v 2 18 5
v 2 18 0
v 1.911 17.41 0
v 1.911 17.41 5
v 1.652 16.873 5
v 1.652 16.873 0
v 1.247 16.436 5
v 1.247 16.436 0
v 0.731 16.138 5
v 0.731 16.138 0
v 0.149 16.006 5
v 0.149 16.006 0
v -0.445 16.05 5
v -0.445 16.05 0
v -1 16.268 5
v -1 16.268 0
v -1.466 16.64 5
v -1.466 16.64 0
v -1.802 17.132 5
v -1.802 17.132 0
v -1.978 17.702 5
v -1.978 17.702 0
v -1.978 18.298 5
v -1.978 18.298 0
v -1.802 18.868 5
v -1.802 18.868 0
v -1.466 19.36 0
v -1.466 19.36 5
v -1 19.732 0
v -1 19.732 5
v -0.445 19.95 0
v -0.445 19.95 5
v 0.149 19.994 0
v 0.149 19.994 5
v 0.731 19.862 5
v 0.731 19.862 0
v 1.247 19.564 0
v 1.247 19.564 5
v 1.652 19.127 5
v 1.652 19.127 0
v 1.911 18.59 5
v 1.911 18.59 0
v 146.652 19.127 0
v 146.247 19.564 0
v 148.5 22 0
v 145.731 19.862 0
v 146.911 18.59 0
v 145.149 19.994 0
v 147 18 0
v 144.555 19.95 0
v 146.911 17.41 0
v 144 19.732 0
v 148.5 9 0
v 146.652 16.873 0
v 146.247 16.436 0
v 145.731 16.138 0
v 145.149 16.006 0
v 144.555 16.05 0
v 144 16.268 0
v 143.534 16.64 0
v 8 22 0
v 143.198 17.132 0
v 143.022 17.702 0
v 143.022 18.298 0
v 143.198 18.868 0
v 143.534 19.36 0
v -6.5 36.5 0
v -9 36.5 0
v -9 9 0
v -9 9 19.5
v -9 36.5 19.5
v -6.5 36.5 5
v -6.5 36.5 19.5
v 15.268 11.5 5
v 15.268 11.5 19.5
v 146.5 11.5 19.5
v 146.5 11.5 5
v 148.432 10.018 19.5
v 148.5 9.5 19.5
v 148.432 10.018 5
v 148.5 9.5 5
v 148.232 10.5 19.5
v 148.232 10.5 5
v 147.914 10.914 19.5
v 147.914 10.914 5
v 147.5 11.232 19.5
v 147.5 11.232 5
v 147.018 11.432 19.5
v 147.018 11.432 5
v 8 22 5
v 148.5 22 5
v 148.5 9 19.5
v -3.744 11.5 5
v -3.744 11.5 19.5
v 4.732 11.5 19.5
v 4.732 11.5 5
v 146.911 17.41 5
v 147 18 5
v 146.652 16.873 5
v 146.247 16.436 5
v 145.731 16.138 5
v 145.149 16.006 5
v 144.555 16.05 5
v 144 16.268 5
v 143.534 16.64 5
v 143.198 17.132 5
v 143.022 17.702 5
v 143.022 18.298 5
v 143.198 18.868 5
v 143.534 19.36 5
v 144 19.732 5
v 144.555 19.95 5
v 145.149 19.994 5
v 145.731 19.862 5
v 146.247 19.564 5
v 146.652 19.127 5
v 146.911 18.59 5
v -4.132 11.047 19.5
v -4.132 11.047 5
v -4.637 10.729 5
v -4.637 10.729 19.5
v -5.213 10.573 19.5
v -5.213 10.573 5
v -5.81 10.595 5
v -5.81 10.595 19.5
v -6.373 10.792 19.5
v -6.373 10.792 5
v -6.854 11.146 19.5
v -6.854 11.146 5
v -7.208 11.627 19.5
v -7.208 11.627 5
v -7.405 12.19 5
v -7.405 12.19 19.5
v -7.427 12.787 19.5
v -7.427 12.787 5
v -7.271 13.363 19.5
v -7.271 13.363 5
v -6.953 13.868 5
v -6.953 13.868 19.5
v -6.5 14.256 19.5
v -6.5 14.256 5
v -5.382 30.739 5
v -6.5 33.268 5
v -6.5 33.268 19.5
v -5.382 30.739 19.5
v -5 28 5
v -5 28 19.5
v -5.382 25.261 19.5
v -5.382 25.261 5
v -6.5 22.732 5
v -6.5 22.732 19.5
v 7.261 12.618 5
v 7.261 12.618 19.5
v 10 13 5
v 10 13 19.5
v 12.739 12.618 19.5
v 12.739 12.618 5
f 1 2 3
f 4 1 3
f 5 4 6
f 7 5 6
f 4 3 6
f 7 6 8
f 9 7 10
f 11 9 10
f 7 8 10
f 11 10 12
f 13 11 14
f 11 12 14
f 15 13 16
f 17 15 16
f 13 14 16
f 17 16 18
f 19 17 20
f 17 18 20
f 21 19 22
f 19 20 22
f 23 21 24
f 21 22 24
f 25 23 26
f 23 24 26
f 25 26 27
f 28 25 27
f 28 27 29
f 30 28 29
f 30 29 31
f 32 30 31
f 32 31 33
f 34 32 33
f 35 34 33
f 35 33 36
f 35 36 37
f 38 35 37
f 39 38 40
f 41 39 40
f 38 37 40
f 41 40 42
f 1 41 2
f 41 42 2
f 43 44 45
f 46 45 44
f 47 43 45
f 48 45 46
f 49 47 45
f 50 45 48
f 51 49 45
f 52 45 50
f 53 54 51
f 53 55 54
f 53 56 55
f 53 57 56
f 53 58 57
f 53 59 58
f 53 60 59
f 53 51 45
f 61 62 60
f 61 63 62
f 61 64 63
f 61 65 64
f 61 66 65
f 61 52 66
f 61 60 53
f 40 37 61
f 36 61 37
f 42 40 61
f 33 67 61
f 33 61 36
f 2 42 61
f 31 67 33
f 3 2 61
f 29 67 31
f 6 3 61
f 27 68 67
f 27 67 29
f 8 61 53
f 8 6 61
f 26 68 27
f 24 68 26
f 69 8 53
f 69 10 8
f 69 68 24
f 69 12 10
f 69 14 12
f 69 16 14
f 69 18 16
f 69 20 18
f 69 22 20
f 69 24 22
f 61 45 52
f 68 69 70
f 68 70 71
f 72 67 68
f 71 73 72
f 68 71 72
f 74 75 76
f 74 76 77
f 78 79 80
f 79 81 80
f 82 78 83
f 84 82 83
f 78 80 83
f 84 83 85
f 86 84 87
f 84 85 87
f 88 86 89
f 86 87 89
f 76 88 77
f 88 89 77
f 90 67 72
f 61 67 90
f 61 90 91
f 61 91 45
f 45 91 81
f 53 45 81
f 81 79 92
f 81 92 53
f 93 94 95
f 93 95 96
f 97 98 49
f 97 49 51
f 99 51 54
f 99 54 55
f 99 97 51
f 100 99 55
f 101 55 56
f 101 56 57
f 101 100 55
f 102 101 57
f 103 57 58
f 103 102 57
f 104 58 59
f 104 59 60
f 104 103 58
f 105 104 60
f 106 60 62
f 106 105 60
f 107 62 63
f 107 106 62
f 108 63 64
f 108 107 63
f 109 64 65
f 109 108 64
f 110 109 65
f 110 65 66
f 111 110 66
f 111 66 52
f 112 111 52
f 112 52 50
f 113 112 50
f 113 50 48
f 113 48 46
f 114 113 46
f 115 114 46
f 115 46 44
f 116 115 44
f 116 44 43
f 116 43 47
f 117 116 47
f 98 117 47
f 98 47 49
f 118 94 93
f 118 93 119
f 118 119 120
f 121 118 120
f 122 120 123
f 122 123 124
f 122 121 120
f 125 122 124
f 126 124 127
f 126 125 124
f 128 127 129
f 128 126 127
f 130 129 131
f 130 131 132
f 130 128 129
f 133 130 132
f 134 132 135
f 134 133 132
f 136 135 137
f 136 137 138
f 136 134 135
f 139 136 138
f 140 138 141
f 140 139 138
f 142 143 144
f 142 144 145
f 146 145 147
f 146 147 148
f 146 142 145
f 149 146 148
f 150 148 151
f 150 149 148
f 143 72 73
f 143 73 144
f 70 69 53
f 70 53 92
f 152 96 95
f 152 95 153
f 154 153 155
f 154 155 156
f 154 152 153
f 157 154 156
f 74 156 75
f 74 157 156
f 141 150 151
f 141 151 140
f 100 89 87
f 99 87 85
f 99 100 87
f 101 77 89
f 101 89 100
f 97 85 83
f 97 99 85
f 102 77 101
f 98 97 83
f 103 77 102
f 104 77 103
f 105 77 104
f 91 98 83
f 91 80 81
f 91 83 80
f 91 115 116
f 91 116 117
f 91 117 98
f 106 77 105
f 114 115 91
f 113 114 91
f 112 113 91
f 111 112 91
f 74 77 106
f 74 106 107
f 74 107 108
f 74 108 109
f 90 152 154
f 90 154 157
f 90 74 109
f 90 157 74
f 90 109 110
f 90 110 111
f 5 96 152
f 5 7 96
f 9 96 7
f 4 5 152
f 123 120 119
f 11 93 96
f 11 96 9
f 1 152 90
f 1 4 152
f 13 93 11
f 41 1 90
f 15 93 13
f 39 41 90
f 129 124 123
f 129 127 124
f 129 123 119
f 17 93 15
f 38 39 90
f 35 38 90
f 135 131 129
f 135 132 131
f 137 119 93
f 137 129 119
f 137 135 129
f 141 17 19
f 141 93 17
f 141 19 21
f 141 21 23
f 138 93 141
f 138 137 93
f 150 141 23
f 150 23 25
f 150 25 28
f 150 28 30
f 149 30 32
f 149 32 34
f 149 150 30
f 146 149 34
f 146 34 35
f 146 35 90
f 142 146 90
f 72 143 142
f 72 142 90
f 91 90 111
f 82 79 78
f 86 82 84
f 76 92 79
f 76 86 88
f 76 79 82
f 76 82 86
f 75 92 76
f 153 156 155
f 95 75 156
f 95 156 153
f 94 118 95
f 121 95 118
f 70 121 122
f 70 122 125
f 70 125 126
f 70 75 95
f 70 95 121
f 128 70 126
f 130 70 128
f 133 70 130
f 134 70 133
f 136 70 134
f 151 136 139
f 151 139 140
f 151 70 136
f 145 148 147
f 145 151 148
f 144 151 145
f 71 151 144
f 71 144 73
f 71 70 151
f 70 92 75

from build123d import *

# Parameters (mm, degrees)
F0_R      = 2
F1_DEPTH  = 5
F3_DEPTH  = 14.5
F4_R      = 2
F5_DEPTH  = 14.5
F7_DEPTH  = 25
F9_DEPTH  = 5
F11_DEPTH = 154
F12_R     = 2
F12_W     = 44.045060873
F12_H     = 72.3597388715
F13_DEPTH = 15
F15_DEPTH = 14.5
F16_R     = 2


with BuildPart() as f1:
    # F0 (on Top) → F1 (new body)
    with BuildSketch(Plane.XY):
        Polygon((-9, 9), (-9, -21), (21, 9), align=None)
        Circle(F0_R, mode=Mode.SUBTRACT)
    extrude(amount=F1_DEPTH)

    # F2 (on face) → F3 (join)
    with BuildSketch(Plane.XY.offset(5)):
        Polygon((-9, 9), (-9, -21), (-6.5, -18.5), (-6.5, 6.5), (18.5, 6.5), (21, 9), align=None)
    extrude(amount=F3_DEPTH)

    # F4 (on face) → F5 (cut, through all)
    with BuildSketch(Plane.XY.offset(19.5)):
        with Locations((-5.4393398282, 5.4393398282)):
            Circle(F4_R)
    extrude(amount=-F5_DEPTH, mode=Mode.SUBTRACT)

    # F6 (on face) → F7 (cut)
    with BuildSketch(Plane.XY.offset(19.5)):
        Polygon((18.5, 18.9713805318), (18.5, 6.5), (25.3656071275, -18.5), (25.3656071275, 18.9713805318), align=None)
        Polygon((-4.8339825459, -31.5633218139), (-6.5, -18.5), (-15.6000002623, -18.5), (-15.6000002623, -31.5633218139), align=None)
    extrude(amount=-F7_DEPTH, mode=Mode.SUBTRACT)

    # F8 (on face) → F9 (join, through all)
    with BuildSketch(Plane.XY.offset(5)):
        Polygon((18.5, -4), (18.5, 6.5), (8, -4), align=None)
    extrude(amount=-F9_DEPTH)

    # F10 (on face) → F11 (join)
    with BuildSketch(Plane.YZ.offset(18.5)):
        Polygon((-4, 5), (-4, 0), (9, 0), (9, 19.5), (6.5, 19.5), (6.5, 5), align=None)
    extrude(amount=F11_DEPTH)

    # F12 (on face) → F13 (cut, symmetric)
    with BuildSketch(Plane.XY.offset(5)):
        with Locations((145, 0)):
            Circle(F12_R)
        with Locations((170.5225304365, -14.2861837521)):
            Rectangle(F12_W, F12_H)
    extrude(amount=F13_DEPTH, both=True, mode=Mode.SUBTRACT)

    # F14 (on face) → F15 (join, through all)
    with BuildSketch(Plane.XY.offset(5)):
        with BuildLine():
            Line((15.2678268764, 6.5), (4.7321731236, 6.5))
            ThreePointArc((4.7321731236, 6.5), (10, 5), (15.2678268764, 6.5))
        make_face()
        with BuildLine():
            Line((-6.5, -4.7321731236), (-6.5, -15.2678268764))
            ThreePointArc((-6.5, -15.2678268764), (-5, -10), (-6.5, -4.7321731236))
        make_face()
    extrude(amount=F15_DEPTH)

    # F16
    f16_edges = [f1.edges().sort_by_distance(p)[0] for p in [
        (148.5, 6.5, 12.25),
    ]]
    fillet(f16_edges, radius=F16_R)


with BuildPart() as f17_1:
    # F17: instance of F1
    add(f1.part.mirror(Plane(origin=(69.75, 9, 9.75), x_dir=(-1, 0, 0), z_dir=(0, 1, 0))))


solid = f17_1.part
